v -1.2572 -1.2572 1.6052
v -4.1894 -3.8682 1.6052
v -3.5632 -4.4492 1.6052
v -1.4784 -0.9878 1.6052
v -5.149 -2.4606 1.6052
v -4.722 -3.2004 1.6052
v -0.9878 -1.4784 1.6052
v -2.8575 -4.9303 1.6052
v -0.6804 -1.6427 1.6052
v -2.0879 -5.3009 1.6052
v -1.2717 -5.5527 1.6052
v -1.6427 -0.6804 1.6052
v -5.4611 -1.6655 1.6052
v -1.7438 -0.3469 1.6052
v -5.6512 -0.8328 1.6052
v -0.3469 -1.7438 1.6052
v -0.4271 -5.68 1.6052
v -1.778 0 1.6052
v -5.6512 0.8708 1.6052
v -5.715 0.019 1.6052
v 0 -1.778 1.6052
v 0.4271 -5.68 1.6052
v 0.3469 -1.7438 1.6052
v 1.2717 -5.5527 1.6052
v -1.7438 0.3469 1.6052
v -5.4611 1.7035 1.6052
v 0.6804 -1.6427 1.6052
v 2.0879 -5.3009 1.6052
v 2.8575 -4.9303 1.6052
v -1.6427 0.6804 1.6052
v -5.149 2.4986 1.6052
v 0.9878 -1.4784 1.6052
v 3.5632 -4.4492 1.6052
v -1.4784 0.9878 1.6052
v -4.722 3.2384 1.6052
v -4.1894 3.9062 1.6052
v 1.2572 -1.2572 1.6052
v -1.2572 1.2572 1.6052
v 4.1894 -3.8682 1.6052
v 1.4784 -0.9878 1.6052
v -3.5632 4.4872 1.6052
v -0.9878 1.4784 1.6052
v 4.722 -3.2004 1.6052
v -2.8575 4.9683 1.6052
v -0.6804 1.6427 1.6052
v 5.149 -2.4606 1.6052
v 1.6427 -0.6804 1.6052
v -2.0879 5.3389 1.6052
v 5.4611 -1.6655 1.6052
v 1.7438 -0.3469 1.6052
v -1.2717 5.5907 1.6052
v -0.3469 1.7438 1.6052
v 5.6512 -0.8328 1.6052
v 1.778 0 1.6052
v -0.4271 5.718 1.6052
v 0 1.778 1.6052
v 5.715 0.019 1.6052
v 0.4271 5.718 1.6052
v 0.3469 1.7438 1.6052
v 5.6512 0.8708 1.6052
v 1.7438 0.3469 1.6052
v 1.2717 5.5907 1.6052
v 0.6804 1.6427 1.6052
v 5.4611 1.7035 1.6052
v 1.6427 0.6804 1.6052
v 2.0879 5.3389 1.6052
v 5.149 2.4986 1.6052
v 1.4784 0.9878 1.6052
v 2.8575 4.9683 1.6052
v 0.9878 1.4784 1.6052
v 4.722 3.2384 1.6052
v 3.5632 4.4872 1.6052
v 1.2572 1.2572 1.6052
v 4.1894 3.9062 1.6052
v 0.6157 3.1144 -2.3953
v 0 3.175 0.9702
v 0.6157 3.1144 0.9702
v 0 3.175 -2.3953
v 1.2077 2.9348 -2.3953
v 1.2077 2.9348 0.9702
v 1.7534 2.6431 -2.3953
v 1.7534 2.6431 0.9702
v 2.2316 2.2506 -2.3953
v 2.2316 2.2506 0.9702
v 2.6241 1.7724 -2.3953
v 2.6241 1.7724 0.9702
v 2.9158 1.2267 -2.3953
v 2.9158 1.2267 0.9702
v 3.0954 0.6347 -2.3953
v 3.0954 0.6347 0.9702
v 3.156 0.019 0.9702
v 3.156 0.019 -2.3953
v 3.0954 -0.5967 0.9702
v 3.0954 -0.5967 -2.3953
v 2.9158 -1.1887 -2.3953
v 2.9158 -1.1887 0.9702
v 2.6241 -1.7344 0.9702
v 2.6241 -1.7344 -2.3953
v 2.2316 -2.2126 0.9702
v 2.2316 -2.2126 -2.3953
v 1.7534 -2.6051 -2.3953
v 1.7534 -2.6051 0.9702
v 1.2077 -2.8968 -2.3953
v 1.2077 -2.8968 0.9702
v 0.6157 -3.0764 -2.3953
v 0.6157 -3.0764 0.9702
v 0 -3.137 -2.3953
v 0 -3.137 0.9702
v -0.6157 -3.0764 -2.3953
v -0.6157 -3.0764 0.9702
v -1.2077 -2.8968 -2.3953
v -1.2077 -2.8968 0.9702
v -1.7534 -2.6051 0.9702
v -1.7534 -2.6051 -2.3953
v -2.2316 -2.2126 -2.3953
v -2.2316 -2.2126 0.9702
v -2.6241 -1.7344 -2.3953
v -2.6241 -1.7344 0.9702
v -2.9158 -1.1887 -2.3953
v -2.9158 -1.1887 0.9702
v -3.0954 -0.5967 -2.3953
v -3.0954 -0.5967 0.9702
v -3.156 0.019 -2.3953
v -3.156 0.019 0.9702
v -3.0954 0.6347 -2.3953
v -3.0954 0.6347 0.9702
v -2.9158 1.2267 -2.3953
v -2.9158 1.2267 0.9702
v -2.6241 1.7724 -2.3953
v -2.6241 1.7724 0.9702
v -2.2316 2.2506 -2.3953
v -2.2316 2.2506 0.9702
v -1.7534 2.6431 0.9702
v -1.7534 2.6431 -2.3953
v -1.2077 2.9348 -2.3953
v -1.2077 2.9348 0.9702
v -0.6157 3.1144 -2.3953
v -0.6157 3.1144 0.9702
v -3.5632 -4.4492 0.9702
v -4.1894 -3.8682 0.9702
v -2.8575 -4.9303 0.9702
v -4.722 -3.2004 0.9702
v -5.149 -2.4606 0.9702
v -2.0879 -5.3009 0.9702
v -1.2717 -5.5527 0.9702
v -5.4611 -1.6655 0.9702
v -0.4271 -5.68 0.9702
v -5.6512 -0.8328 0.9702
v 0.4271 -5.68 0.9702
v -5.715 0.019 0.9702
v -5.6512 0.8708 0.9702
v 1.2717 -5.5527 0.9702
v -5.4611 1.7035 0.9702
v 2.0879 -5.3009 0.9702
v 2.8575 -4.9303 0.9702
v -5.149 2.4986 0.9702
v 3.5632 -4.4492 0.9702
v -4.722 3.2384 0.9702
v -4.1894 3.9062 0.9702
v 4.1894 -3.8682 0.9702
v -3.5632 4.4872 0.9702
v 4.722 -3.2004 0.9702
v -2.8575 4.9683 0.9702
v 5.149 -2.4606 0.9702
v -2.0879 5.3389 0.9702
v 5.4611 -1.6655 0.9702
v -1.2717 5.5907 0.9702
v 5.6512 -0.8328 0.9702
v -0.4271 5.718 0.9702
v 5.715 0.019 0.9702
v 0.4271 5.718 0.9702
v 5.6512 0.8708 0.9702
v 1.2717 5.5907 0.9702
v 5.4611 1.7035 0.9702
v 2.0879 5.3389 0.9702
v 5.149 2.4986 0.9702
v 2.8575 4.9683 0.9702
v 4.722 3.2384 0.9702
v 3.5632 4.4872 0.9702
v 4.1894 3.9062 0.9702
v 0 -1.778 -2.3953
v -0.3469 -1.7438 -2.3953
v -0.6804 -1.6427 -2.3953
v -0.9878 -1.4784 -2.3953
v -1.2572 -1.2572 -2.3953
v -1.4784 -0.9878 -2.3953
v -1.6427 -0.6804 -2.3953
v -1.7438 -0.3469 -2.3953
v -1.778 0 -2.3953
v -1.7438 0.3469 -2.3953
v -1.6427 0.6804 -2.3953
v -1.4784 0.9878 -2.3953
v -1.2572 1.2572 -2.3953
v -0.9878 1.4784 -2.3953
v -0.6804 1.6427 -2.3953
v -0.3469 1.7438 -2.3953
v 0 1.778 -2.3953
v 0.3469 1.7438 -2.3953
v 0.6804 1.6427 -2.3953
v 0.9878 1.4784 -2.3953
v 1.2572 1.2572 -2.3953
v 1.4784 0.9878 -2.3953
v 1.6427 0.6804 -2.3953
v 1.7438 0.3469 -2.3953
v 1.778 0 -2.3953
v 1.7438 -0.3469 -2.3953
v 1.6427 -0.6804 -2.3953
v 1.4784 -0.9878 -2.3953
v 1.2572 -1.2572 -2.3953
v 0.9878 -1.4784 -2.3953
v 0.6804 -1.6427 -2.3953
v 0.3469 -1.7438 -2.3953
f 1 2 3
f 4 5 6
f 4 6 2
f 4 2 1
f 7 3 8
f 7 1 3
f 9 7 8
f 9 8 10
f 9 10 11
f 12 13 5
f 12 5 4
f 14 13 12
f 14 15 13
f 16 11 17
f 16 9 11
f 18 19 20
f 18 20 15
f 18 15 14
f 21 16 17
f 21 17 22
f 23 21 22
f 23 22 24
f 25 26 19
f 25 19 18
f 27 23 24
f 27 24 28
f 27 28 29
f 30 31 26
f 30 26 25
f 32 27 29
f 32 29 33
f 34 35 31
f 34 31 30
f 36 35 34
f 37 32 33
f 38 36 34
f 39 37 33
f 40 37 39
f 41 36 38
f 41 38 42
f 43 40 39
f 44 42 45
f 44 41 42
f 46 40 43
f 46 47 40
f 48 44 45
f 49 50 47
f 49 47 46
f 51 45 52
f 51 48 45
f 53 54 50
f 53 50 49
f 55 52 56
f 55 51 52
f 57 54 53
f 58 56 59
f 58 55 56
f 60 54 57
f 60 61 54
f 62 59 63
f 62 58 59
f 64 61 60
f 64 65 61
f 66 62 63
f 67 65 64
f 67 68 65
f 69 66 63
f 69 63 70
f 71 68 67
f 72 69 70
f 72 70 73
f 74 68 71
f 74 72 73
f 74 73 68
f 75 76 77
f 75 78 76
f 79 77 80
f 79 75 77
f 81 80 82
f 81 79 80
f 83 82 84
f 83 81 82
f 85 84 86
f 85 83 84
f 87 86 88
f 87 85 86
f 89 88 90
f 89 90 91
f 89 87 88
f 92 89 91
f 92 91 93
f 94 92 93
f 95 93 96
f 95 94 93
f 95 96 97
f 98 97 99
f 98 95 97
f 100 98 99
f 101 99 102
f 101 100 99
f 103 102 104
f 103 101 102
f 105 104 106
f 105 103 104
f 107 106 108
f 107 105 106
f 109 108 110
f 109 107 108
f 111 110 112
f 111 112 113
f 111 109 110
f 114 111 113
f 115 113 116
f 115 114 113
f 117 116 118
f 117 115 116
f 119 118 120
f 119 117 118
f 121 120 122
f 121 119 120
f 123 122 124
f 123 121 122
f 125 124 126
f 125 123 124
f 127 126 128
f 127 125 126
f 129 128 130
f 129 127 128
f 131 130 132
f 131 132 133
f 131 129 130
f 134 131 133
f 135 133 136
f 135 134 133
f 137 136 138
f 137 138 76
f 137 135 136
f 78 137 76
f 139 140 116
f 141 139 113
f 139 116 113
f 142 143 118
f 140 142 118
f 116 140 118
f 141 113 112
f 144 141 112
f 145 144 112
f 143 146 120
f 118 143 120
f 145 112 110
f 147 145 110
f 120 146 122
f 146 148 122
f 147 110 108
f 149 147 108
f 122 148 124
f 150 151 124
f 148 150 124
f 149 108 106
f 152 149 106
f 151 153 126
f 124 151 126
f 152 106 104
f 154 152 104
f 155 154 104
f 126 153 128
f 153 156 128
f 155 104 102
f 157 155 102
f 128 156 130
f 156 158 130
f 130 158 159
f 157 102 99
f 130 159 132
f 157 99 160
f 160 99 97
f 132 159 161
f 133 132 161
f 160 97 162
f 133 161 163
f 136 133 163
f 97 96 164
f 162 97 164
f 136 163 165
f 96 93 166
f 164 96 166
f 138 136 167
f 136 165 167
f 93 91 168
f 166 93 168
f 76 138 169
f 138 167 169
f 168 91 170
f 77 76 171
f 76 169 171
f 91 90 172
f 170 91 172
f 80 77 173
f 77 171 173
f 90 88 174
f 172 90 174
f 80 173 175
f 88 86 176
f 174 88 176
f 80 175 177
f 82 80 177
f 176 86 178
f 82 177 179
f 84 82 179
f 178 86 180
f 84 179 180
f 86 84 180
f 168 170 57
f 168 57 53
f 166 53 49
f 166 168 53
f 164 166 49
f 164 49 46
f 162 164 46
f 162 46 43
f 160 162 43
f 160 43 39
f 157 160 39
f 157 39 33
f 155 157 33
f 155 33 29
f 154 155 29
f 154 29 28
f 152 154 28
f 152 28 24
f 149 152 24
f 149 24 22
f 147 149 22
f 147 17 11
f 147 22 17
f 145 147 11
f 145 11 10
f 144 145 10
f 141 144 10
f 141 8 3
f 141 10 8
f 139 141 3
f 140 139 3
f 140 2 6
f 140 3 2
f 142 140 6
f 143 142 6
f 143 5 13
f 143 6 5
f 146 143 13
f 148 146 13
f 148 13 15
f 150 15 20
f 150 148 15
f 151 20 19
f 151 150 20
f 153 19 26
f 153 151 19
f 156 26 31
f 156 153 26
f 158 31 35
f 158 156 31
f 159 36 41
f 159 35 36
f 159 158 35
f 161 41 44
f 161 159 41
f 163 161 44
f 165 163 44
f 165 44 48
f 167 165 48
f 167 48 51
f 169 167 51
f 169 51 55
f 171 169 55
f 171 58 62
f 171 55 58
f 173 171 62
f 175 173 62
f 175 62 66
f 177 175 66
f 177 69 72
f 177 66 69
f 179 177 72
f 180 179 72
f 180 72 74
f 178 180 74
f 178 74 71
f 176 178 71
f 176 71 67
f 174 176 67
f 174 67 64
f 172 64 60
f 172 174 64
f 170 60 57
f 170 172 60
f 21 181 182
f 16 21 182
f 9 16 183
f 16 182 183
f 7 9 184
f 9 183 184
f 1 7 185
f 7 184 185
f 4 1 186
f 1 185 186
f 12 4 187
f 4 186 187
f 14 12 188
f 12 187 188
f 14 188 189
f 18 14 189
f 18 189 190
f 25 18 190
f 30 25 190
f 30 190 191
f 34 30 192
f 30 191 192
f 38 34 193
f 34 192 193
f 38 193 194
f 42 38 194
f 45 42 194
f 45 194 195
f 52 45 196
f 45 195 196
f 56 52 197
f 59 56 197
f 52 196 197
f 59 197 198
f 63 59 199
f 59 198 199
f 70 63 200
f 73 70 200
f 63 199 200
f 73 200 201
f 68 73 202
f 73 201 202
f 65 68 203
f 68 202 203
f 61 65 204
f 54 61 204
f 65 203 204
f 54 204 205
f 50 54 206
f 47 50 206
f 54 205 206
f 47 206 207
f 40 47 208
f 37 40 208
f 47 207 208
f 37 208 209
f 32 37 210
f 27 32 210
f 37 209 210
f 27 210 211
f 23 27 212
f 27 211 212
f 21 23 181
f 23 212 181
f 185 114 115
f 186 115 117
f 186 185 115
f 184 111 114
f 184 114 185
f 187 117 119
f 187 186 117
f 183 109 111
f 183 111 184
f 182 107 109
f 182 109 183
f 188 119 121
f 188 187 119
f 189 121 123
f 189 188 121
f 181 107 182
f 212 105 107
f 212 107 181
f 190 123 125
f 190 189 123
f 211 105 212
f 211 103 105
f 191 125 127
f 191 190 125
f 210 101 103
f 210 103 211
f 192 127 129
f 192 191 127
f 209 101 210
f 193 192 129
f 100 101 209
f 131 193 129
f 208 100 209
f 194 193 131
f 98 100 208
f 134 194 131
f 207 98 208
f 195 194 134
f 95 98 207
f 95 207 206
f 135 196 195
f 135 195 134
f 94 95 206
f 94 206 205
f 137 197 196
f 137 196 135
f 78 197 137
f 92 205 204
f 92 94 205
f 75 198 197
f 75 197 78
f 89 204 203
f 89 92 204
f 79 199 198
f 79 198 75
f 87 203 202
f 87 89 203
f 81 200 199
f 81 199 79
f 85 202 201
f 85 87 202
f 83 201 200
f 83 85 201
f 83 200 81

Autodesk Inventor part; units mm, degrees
ref_plane "YZ Plane" through (0, 0, 0) normal (1, 0, 0) x (0, 1, 0)
ref_plane "XZ Plane" through (0, 0, 0) normal (0, 1, 0) x (-1, 0, 0)
ref_plane "XY Plane" through (0, 0, 0) normal (0, 0, 1) x (1, 0, 0)
sketch "Sketch1" plane through (0, 0, 0) normal (1, 0, 0) x (0, 1, 0)
  line L0 (0.019, 0.9702) -> (3.175, 0.9702)
  line L1 (3.175, 0.9702) -> (3.175, -2.3953)
  line L2 (0.019, 9.2838) -> (0.019, -29.9451)
  line L3 (3.175, -2.3953) -> (0.019, -2.3953)
  point P0 (0, 0)
  dimension "d3" = 3.1559
  dimension "d4" = 3.3655
revolve "Revolution1" add sketch "Sketch1" angle 360 about axis through (0, 0.019, 9.2838) along (0, 0, -1)
sketch "Sketch3" plane through (0, 0.019, 0.9702) normal (0, 0, 1) x (1, 0, 0)
  circle A0 centre (0, 0) radius 5.715
  point P0 (0, -0.019)
extrude "Extrusion2" add sketch "Sketch3" along normal blind 0.635
sketch "Sketch4" plane through (0, 0.019, 1.6052) normal (0, 0, 1) x (1, 0, 0)
  point P0 (0, -0.019)
  point P1 (0, -0.019)
hole "Hole2" at (0, 0, 1.6052) direction (0, 0, -1) diameter 3.556 end through all
properties part number "bearing"
